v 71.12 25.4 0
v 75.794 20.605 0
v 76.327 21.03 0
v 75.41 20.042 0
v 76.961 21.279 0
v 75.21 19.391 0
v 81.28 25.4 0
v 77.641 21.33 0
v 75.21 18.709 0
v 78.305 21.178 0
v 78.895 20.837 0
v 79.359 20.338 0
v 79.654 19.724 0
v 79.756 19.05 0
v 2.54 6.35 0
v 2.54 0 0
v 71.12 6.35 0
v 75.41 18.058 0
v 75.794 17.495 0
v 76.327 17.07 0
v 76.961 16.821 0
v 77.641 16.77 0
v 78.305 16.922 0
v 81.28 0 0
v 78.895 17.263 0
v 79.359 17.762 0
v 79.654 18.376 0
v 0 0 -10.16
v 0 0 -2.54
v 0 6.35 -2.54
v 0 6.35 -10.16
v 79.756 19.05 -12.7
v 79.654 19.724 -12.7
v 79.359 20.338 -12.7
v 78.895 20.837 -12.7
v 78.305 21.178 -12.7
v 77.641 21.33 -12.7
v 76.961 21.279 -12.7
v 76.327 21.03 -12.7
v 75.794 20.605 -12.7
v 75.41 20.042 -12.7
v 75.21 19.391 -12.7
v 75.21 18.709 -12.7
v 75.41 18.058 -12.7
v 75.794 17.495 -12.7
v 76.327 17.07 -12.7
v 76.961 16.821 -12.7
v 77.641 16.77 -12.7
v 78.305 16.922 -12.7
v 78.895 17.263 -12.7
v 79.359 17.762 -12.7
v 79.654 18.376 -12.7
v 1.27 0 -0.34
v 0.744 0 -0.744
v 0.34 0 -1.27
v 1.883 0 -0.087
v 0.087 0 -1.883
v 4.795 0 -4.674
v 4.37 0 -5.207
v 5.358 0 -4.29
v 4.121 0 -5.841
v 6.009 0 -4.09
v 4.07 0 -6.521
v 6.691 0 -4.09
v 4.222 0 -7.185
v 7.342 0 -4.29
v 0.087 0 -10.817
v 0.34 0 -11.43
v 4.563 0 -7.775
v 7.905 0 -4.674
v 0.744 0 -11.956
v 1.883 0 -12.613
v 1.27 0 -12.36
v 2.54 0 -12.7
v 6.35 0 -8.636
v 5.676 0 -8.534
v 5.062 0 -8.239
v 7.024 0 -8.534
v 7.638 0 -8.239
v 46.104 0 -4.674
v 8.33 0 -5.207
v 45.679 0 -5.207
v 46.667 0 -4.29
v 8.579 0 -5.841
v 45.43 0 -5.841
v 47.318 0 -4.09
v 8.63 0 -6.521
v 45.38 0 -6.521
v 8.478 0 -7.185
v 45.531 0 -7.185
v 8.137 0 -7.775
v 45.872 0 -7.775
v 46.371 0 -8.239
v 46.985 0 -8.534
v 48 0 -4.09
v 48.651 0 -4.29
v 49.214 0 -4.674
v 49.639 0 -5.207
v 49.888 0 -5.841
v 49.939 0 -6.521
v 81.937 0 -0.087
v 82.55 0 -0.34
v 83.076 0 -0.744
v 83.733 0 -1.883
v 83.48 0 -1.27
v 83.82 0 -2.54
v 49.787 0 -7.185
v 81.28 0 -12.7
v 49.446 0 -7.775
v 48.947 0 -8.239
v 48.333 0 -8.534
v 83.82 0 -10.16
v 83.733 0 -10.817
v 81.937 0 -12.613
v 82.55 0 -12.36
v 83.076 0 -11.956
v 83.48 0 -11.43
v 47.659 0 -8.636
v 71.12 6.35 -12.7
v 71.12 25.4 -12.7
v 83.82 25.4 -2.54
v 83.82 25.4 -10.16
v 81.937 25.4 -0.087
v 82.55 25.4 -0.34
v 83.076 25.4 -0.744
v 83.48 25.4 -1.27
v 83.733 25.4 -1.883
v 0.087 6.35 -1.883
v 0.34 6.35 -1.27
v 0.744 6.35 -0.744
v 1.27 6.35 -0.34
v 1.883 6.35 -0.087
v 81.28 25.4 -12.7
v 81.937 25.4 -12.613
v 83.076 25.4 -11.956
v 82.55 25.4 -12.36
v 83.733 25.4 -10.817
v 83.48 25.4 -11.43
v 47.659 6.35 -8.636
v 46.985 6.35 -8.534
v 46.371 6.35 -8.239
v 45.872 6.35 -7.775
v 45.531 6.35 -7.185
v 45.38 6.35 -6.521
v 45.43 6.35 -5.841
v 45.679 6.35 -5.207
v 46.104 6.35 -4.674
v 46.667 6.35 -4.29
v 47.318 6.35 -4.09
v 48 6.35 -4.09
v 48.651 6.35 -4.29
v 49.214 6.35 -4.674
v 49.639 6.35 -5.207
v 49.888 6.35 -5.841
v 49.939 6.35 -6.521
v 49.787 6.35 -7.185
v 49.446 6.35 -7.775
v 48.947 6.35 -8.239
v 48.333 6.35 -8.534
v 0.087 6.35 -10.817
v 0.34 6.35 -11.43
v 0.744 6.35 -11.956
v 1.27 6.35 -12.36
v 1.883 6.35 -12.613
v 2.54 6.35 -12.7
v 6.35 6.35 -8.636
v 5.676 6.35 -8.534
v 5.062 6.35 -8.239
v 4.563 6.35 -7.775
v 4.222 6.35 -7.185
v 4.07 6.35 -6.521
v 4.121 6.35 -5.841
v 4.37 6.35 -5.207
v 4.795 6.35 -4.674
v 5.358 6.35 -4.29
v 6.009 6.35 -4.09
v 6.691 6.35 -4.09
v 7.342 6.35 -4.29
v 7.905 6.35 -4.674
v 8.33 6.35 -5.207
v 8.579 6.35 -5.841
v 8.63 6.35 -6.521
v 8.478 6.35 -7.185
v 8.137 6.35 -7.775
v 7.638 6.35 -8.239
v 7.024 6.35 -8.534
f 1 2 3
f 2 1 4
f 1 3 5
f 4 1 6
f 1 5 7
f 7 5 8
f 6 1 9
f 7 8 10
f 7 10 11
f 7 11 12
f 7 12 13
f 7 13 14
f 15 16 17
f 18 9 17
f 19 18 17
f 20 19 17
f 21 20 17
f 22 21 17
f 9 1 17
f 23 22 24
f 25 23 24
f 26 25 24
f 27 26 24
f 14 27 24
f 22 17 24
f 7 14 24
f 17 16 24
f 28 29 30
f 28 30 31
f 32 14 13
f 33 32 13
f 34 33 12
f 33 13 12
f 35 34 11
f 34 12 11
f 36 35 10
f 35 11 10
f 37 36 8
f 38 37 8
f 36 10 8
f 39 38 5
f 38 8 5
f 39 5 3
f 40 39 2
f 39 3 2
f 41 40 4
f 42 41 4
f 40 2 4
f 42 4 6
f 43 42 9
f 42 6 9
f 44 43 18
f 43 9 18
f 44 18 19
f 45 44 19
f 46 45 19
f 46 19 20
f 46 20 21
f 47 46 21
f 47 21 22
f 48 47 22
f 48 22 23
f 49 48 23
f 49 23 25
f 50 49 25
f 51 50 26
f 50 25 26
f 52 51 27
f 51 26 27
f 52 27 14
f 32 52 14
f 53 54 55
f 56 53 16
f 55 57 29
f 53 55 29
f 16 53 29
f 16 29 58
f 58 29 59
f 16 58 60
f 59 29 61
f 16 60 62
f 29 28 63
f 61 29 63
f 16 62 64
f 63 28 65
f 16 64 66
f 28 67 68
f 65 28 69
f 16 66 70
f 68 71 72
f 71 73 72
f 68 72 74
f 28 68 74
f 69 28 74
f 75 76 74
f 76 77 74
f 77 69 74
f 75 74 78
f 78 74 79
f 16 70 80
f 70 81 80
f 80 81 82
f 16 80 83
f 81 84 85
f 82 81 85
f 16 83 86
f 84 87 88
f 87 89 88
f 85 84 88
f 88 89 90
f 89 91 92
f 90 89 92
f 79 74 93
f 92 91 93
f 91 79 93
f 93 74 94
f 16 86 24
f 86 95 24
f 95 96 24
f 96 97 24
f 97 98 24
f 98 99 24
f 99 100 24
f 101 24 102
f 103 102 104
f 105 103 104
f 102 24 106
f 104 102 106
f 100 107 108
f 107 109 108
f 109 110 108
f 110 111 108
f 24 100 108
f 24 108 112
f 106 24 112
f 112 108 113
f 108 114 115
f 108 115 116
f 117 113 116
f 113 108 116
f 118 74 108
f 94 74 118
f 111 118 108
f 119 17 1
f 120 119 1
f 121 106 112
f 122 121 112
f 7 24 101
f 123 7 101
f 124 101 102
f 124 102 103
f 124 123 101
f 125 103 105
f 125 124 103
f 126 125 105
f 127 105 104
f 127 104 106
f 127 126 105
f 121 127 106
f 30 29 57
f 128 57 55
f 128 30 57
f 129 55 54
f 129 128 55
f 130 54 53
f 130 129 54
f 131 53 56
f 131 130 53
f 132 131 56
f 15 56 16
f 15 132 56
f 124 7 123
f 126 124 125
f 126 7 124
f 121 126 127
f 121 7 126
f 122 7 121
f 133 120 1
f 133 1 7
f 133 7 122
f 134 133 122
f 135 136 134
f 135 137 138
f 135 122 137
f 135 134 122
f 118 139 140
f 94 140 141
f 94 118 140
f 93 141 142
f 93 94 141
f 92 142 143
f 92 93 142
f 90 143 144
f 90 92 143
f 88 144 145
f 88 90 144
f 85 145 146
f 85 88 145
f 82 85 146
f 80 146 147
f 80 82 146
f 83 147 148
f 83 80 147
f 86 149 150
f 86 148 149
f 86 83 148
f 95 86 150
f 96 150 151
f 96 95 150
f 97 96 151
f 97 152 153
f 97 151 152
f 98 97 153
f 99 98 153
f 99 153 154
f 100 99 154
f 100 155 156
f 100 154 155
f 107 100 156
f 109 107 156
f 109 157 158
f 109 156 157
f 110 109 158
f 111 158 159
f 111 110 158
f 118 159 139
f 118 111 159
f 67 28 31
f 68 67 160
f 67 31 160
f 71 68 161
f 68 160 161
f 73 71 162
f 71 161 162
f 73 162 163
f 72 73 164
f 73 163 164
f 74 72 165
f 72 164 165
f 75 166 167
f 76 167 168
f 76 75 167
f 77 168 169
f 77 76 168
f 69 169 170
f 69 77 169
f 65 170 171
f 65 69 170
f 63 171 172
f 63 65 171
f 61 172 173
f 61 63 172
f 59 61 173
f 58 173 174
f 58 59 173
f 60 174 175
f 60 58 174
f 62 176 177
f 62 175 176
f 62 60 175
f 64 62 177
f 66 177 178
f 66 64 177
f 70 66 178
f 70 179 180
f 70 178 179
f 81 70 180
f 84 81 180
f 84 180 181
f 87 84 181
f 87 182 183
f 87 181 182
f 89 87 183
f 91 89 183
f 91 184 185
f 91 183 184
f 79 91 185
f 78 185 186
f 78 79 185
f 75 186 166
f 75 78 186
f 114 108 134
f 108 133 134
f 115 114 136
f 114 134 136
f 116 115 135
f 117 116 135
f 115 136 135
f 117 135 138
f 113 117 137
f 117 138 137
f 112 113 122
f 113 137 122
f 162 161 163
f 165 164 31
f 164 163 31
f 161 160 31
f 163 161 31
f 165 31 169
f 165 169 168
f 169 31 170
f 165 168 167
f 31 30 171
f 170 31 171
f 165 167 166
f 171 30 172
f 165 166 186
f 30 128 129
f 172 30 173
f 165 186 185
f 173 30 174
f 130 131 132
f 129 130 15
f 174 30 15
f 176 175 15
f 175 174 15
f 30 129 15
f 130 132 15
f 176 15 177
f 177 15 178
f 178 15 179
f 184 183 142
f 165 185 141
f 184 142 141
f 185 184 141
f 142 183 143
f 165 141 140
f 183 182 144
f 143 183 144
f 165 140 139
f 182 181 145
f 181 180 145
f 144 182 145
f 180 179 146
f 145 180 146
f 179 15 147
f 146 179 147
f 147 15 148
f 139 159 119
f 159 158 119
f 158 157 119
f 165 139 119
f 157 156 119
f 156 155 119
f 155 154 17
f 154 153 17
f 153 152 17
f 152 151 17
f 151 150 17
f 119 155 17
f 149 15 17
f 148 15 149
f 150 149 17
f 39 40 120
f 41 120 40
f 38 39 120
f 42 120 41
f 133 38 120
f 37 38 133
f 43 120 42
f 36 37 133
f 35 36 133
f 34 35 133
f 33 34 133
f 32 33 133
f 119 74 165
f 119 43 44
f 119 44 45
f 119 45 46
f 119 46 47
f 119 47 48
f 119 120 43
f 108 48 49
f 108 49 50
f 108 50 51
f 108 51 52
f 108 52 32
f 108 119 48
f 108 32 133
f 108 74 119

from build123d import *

# Parameters (mm, degrees)
SKETCH1_W           = 83.82
SKETCH1_H           = 12.7
SKETCH1_R           = 2.286
BOSS_EXTRUDE1_DEPTH = 25.4
SKETCH2_R           = 2.286
CUT_EXTRUDE1_DEPTH  = 12.7
FILLET1_R           = 2.54
SKETCH3_W           = 71.12
SKETCH3_H           = 19.05
CUT_EXTRUDE2_DEPTH  = 89.499957062


with BuildPart() as part:
    # Sketch1 → Boss-Extrude1 (new body)
    with BuildSketch(Plane(origin=(0, 0, 0), x_dir=(1, 0, 0), z_dir=(0, 1, 0))):
        with Locations((41.91, 6.35)):
            Rectangle(SKETCH1_W, SKETCH1_H)
        with Locations(Location((6.35, 6.35, 0), (0, 0, 90))):
            Circle(SKETCH1_R, mode=Mode.SUBTRACT)
        with Locations(Location((47.659178157, 6.35, 0), (0, 0, 90))):
            Circle(SKETCH1_R, mode=Mode.SUBTRACT)
    extrude(amount=BOSS_EXTRUDE1_DEPTH)

    # Sketch2 → Cut-Extrude1 (cut)
    with BuildSketch(Plane.XY):
        with Locations((77.47, 19.05)):
            Circle(SKETCH2_R)
    extrude(amount=-CUT_EXTRUDE1_DEPTH, mode=Mode.SUBTRACT)

    # Fillet1
    fillet1_edges = [part.edges().sort_by_distance(p)[0] for p in [
        (0, 12.7, -12.7),
        (83.82, 12.7, -12.7),
        (83.82, 12.7, 0),
        (0, 12.7, 0),
    ]]
    fillet(fillet1_edges, radius=FILLET1_R)

    # Sketch3 → Cut-Extrude2 (cut, through all)
    with BuildSketch(Plane.XY):
        with Locations((35.56, 15.875)):
            Rectangle(SKETCH3_W, SKETCH3_H)
    extrude(amount=-CUT_EXTRUDE2_DEPTH, mode=Mode.SUBTRACT)


solid = part.part
